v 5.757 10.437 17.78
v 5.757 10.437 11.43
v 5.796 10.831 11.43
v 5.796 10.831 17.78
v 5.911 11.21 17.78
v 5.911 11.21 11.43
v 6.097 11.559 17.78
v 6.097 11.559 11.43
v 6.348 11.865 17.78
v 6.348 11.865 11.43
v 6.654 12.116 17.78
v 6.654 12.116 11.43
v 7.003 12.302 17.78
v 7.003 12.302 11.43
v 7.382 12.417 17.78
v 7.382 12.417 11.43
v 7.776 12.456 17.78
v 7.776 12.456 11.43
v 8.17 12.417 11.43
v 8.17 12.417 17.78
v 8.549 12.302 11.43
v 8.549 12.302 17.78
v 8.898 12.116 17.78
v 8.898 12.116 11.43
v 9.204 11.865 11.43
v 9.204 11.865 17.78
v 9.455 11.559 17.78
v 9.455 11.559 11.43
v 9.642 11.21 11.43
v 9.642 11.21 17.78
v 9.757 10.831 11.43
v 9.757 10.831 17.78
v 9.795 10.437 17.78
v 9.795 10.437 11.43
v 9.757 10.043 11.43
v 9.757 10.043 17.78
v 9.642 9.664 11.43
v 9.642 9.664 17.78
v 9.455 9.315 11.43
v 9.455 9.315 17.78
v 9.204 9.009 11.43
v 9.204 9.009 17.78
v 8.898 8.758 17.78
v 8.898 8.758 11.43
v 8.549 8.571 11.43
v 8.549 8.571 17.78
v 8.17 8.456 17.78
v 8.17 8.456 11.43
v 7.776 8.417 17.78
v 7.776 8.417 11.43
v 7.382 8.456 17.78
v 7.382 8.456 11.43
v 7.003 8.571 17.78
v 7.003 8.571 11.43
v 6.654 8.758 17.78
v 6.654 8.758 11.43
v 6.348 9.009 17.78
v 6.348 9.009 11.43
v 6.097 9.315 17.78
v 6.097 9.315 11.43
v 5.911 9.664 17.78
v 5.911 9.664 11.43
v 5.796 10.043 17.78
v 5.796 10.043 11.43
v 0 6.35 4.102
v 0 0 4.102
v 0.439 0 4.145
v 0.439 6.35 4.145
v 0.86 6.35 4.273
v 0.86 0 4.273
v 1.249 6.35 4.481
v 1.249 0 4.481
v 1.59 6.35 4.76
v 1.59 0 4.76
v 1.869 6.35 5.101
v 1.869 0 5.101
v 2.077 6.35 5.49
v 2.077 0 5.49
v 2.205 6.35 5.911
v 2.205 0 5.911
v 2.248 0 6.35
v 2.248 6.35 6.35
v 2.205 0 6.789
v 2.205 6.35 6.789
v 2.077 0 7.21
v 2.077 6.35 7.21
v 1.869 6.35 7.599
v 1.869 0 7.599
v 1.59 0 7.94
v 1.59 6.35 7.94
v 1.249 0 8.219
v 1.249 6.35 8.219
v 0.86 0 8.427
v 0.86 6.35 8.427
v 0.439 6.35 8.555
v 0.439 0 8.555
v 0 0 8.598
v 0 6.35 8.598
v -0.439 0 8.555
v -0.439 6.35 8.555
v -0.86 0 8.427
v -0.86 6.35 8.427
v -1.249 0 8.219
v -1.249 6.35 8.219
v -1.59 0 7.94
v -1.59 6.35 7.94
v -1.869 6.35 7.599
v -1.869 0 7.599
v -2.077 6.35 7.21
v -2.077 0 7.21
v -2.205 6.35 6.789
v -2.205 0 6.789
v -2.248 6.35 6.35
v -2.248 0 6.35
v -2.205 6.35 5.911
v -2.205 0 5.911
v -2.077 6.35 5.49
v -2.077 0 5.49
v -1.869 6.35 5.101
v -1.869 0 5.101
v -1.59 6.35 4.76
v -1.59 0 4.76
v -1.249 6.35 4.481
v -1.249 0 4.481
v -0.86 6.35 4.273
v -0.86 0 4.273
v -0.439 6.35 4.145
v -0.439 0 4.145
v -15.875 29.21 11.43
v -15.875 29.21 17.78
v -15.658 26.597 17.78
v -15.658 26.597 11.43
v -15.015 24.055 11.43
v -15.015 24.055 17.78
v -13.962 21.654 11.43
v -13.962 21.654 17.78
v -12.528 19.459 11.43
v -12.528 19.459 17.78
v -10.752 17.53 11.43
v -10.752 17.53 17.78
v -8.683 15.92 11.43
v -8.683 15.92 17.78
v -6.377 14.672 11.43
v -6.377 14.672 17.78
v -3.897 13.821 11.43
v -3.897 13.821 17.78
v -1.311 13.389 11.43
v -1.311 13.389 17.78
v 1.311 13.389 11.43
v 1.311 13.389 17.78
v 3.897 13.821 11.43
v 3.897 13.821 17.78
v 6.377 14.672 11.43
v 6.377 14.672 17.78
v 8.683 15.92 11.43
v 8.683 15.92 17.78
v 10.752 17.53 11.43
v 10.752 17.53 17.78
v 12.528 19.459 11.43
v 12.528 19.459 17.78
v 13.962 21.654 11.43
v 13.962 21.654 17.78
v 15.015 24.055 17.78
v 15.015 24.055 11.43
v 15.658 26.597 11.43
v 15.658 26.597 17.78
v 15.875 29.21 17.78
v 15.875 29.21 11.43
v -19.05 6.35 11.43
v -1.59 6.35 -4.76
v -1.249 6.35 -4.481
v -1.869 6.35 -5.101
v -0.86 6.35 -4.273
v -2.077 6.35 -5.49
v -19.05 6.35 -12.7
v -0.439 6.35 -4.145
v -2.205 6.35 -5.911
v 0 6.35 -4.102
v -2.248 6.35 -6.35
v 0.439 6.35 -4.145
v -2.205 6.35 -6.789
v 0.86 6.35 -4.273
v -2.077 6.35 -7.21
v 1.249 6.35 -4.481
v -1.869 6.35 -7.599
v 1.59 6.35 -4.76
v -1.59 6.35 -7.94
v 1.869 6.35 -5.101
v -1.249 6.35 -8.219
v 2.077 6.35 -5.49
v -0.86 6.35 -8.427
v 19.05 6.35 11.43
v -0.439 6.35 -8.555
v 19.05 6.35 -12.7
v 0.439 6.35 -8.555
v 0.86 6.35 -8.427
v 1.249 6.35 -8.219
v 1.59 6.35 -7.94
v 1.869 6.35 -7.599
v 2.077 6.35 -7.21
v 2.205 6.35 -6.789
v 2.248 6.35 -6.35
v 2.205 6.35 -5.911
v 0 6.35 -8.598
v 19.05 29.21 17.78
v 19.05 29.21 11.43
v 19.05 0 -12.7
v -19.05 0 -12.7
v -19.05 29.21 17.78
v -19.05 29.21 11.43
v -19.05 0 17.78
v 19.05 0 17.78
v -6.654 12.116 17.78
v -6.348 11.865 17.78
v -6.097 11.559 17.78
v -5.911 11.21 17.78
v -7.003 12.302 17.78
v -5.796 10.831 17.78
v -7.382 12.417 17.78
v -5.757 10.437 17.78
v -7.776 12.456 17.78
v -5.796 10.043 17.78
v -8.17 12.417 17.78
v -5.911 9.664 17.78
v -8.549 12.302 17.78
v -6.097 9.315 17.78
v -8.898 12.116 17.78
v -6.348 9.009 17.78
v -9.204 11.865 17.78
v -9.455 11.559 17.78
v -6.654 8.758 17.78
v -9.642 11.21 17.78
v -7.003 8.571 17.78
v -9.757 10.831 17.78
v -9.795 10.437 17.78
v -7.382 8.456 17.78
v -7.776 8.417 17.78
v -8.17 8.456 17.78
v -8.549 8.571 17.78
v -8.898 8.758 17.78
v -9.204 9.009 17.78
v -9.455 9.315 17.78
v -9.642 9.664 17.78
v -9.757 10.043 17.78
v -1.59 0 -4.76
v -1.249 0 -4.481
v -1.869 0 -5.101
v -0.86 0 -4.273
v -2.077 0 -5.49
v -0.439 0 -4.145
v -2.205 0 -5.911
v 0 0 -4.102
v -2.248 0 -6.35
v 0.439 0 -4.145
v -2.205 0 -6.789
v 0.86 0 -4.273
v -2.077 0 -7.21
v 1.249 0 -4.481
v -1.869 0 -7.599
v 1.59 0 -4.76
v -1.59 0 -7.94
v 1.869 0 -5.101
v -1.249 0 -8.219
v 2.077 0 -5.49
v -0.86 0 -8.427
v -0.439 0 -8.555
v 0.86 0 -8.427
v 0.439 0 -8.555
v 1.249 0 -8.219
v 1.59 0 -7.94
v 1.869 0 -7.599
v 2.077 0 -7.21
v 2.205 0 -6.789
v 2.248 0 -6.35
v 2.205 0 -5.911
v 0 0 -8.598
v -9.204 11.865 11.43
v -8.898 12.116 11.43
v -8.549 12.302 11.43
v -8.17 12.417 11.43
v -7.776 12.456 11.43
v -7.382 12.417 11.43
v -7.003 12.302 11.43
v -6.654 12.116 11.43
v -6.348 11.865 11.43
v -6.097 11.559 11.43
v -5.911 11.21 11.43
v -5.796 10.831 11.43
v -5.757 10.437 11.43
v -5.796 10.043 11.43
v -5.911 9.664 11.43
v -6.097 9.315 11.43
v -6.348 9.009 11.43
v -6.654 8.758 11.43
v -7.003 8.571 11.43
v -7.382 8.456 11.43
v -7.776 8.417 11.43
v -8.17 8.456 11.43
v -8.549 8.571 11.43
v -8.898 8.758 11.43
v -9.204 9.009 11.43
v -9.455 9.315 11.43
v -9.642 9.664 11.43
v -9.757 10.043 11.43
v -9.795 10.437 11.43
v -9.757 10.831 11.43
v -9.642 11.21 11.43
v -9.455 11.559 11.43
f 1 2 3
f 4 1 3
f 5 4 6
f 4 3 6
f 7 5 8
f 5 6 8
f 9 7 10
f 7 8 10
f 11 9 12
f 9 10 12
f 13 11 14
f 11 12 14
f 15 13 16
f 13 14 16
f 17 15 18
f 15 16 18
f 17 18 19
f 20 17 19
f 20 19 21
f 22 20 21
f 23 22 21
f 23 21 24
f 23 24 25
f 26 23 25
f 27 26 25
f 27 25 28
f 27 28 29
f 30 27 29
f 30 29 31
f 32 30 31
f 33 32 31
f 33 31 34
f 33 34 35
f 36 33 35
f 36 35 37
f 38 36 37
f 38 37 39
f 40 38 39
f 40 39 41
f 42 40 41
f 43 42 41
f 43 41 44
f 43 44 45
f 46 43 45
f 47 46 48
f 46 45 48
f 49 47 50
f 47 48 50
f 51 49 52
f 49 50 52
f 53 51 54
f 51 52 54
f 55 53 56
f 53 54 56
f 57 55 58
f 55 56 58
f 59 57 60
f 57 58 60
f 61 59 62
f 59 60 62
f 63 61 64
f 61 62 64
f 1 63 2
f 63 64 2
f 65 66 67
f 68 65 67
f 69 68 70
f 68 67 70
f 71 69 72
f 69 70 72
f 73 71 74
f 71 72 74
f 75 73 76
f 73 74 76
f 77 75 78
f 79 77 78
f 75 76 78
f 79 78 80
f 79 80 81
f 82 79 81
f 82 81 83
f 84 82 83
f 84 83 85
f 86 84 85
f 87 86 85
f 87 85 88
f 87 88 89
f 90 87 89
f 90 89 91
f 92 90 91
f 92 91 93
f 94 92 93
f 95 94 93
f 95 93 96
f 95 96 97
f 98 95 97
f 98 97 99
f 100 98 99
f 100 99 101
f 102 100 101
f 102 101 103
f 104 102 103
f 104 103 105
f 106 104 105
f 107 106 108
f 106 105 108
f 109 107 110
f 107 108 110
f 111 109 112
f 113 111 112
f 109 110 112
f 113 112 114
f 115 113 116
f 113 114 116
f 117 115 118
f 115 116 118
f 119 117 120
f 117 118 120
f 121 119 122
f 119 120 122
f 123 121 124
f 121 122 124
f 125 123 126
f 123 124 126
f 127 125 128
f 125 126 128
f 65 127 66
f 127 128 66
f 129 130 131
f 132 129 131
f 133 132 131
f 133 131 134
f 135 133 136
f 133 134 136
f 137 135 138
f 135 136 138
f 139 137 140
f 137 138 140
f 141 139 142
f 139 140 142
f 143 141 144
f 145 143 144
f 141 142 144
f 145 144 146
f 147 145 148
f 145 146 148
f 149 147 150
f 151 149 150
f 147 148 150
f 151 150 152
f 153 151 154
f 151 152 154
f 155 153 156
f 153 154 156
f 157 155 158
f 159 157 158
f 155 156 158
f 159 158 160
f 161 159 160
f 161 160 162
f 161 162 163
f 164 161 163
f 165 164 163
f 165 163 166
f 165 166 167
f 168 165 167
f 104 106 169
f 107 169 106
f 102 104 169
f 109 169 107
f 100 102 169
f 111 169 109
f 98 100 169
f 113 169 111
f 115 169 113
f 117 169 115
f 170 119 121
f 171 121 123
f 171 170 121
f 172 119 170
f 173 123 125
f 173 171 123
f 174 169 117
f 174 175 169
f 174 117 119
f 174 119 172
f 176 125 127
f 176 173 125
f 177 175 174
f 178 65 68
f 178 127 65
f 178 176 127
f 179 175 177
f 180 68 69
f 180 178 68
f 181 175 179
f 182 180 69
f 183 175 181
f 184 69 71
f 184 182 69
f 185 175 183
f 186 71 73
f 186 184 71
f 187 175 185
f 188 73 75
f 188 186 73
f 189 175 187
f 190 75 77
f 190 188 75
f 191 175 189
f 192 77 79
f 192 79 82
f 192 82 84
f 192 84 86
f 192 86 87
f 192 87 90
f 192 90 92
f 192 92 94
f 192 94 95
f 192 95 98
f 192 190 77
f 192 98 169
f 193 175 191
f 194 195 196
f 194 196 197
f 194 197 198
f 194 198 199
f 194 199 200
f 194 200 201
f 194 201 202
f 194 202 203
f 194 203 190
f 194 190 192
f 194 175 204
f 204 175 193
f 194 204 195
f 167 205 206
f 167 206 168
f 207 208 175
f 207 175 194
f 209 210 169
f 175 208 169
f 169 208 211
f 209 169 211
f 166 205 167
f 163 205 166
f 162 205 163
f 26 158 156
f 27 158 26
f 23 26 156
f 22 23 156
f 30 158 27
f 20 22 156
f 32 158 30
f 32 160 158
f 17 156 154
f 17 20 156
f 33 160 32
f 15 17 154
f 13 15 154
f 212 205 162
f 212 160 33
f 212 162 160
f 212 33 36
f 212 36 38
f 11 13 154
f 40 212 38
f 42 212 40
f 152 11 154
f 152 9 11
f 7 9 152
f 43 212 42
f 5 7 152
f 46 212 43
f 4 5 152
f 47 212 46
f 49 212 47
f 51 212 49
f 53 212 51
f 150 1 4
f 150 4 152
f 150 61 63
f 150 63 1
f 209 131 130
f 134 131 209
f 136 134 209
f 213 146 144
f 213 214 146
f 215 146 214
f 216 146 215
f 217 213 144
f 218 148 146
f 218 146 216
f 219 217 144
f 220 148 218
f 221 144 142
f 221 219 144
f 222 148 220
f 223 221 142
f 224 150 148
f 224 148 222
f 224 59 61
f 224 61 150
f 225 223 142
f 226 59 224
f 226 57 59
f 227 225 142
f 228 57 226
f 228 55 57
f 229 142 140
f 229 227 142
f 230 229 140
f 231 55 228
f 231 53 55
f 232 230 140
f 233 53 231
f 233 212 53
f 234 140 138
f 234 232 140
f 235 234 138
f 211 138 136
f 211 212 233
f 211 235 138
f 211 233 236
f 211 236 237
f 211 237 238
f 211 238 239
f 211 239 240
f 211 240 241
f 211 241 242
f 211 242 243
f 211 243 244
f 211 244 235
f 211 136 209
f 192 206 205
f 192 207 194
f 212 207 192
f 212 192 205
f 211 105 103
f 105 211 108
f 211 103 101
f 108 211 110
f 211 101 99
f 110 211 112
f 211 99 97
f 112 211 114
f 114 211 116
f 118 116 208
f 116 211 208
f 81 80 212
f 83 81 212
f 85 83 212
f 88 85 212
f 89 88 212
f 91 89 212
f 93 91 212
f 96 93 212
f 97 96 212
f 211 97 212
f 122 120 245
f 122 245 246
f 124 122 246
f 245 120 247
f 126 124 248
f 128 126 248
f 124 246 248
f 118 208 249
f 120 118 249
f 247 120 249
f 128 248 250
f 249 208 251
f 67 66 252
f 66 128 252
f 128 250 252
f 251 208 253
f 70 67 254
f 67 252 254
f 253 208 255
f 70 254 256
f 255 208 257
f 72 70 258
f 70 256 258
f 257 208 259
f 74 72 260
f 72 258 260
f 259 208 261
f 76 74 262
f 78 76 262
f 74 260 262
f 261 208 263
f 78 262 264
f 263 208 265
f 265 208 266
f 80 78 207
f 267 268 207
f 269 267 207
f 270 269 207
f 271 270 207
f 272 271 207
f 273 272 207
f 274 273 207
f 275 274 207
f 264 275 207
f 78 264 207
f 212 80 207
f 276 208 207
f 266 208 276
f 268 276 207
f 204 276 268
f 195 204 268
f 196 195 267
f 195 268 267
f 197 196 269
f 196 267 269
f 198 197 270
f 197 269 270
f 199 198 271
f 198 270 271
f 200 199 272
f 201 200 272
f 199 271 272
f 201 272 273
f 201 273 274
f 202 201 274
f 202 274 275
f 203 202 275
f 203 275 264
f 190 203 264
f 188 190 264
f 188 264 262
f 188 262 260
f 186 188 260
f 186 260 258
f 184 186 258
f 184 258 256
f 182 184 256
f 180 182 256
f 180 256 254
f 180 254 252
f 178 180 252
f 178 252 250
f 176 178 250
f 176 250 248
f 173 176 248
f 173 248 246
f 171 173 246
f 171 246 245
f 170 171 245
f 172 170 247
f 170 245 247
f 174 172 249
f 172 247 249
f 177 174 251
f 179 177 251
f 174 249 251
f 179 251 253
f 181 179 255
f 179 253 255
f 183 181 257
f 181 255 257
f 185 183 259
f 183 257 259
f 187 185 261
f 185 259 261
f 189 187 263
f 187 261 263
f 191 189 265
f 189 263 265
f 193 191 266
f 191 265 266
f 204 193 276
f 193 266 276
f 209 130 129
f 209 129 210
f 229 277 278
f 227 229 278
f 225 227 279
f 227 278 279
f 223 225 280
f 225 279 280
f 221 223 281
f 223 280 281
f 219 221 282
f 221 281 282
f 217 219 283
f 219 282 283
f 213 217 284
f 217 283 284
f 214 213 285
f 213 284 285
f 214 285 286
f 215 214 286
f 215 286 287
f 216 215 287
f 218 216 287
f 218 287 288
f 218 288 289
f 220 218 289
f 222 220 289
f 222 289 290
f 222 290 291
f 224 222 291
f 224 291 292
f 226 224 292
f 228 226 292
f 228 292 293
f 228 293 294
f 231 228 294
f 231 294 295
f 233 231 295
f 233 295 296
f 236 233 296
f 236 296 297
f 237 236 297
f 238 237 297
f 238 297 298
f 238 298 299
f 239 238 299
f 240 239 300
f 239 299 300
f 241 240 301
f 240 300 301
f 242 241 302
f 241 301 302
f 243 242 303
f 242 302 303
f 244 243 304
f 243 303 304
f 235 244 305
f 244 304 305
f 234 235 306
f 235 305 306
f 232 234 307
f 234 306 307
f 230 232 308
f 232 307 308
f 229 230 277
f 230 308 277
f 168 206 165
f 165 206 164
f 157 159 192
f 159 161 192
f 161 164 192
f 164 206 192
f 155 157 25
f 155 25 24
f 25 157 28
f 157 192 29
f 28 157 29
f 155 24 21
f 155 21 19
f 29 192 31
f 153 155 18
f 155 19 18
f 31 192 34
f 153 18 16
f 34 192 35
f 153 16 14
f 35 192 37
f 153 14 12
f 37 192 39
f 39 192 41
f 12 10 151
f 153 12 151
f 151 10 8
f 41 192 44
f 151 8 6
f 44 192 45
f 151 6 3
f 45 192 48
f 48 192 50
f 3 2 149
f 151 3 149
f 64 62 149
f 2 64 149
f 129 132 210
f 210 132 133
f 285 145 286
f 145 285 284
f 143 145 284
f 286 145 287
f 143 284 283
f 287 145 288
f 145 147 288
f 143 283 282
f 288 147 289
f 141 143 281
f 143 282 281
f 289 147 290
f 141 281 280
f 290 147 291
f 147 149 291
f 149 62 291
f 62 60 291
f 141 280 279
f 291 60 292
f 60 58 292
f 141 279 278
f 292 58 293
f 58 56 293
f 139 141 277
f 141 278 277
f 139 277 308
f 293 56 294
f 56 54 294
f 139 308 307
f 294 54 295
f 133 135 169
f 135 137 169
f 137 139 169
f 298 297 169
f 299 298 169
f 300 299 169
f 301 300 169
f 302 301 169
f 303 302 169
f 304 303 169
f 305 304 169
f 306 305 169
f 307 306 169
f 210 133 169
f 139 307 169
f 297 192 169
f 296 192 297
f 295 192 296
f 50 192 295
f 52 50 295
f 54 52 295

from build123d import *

# Parameters (mm, degrees)
SKETCH1_W                       = 38.1
SKETCH1_H                       = 30.48
EXTRUDE1_DEPTH                  = 6.35
SKETCH2_W                       = 38.1
SKETCH2_H                       = 6.35
EXTRUDE2_DEPTH                  = 22.86
F_16_0_177_DIAMETER_HOLE3_D     = 4.4958
F_16_0_177_DIAMETER_HOLE3_DEPTH = 58.42
F_16_0_177_DIAMETER_HOLE3_TIP   = 1.350674586
SKETCH6_R                       = 15.875
CUT_EXTRUDE2_DEPTH              = 25.4
F_10_32_TAPPED_HOLE1_D          = 4.0386
CIRPATTERN1_COUNT               = 2
CIRPATTERN1_ANGLE               = 45


with BuildPart() as part:
    # Sketch1 → Extrude1 (new body)
    with BuildSketch(Plane(origin=(0, 0, 0), x_dir=(1, 0, 0), z_dir=(0, 1, 0))):
        with Locations((0, -2.54)):
            Rectangle(SKETCH1_W, SKETCH1_H)
    extrude(amount=EXTRUDE1_DEPTH)

    # Sketch2 → Extrude2 (add)
    with BuildSketch(Plane(origin=(0, 6.35, 0), x_dir=(-1, 0, 0), z_dir=(0, 1, 0))):
        with Locations((0, 14.605)):
            Rectangle(SKETCH2_W, SKETCH2_H)
    extrude(amount=EXTRUDE2_DEPTH)

    # #16 (0.177) Diameter Hole3
    with Locations(Plane(origin=(0, 6.35, 6.35), x_dir=(0, 0, 1), z_dir=(0, 1, 0))):
        with Locations((0, 0), (-12.7, 0)):
            Hole(F_16_0_177_DIAMETER_HOLE3_D / 2, depth=F_16_0_177_DIAMETER_HOLE3_DEPTH)
            with Locations((0, 0, -(F_16_0_177_DIAMETER_HOLE3_DEPTH + F_16_0_177_DIAMETER_HOLE3_TIP / 2))):  # 118° drill point
                Cone(0, F_16_0_177_DIAMETER_HOLE3_D / 2, F_16_0_177_DIAMETER_HOLE3_TIP, mode=Mode.SUBTRACT)

    # Sketch6 → Cut-Extrude2 (cut)
    with BuildSketch(Plane.XY.offset(17.78)):
        with Locations((0, 29.21)):
            Circle(SKETCH6_R)
    extrude(amount=-CUT_EXTRUDE2_DEPTH, mode=Mode.SUBTRACT)

    # #10-32 Tapped Hole1 (through all)
    with Locations(Plane(origin=(7.776127346, 10.436767899, 17.78), x_dir=(1, 0, 0), z_dir=(0, 0, 1))):
        with Locations((0, 0)):
            f_10_32_tapped_hole1 = Hole(F_10_32_TAPPED_HOLE1_D / 2)

    # CirPattern1: #10-32 Tapped Hole1 ×2 about axis
    cirpattern1_axis = Axis((0, 29.21, 35.207153655), (0, 0, -1))
    for i in range(1, CIRPATTERN1_COUNT):
        add(f_10_32_tapped_hole1.rotate(cirpattern1_axis, i * CIRPATTERN1_ANGLE / (CIRPATTERN1_COUNT - 1)), mode=Mode.SUBTRACT)


solid = part.part
